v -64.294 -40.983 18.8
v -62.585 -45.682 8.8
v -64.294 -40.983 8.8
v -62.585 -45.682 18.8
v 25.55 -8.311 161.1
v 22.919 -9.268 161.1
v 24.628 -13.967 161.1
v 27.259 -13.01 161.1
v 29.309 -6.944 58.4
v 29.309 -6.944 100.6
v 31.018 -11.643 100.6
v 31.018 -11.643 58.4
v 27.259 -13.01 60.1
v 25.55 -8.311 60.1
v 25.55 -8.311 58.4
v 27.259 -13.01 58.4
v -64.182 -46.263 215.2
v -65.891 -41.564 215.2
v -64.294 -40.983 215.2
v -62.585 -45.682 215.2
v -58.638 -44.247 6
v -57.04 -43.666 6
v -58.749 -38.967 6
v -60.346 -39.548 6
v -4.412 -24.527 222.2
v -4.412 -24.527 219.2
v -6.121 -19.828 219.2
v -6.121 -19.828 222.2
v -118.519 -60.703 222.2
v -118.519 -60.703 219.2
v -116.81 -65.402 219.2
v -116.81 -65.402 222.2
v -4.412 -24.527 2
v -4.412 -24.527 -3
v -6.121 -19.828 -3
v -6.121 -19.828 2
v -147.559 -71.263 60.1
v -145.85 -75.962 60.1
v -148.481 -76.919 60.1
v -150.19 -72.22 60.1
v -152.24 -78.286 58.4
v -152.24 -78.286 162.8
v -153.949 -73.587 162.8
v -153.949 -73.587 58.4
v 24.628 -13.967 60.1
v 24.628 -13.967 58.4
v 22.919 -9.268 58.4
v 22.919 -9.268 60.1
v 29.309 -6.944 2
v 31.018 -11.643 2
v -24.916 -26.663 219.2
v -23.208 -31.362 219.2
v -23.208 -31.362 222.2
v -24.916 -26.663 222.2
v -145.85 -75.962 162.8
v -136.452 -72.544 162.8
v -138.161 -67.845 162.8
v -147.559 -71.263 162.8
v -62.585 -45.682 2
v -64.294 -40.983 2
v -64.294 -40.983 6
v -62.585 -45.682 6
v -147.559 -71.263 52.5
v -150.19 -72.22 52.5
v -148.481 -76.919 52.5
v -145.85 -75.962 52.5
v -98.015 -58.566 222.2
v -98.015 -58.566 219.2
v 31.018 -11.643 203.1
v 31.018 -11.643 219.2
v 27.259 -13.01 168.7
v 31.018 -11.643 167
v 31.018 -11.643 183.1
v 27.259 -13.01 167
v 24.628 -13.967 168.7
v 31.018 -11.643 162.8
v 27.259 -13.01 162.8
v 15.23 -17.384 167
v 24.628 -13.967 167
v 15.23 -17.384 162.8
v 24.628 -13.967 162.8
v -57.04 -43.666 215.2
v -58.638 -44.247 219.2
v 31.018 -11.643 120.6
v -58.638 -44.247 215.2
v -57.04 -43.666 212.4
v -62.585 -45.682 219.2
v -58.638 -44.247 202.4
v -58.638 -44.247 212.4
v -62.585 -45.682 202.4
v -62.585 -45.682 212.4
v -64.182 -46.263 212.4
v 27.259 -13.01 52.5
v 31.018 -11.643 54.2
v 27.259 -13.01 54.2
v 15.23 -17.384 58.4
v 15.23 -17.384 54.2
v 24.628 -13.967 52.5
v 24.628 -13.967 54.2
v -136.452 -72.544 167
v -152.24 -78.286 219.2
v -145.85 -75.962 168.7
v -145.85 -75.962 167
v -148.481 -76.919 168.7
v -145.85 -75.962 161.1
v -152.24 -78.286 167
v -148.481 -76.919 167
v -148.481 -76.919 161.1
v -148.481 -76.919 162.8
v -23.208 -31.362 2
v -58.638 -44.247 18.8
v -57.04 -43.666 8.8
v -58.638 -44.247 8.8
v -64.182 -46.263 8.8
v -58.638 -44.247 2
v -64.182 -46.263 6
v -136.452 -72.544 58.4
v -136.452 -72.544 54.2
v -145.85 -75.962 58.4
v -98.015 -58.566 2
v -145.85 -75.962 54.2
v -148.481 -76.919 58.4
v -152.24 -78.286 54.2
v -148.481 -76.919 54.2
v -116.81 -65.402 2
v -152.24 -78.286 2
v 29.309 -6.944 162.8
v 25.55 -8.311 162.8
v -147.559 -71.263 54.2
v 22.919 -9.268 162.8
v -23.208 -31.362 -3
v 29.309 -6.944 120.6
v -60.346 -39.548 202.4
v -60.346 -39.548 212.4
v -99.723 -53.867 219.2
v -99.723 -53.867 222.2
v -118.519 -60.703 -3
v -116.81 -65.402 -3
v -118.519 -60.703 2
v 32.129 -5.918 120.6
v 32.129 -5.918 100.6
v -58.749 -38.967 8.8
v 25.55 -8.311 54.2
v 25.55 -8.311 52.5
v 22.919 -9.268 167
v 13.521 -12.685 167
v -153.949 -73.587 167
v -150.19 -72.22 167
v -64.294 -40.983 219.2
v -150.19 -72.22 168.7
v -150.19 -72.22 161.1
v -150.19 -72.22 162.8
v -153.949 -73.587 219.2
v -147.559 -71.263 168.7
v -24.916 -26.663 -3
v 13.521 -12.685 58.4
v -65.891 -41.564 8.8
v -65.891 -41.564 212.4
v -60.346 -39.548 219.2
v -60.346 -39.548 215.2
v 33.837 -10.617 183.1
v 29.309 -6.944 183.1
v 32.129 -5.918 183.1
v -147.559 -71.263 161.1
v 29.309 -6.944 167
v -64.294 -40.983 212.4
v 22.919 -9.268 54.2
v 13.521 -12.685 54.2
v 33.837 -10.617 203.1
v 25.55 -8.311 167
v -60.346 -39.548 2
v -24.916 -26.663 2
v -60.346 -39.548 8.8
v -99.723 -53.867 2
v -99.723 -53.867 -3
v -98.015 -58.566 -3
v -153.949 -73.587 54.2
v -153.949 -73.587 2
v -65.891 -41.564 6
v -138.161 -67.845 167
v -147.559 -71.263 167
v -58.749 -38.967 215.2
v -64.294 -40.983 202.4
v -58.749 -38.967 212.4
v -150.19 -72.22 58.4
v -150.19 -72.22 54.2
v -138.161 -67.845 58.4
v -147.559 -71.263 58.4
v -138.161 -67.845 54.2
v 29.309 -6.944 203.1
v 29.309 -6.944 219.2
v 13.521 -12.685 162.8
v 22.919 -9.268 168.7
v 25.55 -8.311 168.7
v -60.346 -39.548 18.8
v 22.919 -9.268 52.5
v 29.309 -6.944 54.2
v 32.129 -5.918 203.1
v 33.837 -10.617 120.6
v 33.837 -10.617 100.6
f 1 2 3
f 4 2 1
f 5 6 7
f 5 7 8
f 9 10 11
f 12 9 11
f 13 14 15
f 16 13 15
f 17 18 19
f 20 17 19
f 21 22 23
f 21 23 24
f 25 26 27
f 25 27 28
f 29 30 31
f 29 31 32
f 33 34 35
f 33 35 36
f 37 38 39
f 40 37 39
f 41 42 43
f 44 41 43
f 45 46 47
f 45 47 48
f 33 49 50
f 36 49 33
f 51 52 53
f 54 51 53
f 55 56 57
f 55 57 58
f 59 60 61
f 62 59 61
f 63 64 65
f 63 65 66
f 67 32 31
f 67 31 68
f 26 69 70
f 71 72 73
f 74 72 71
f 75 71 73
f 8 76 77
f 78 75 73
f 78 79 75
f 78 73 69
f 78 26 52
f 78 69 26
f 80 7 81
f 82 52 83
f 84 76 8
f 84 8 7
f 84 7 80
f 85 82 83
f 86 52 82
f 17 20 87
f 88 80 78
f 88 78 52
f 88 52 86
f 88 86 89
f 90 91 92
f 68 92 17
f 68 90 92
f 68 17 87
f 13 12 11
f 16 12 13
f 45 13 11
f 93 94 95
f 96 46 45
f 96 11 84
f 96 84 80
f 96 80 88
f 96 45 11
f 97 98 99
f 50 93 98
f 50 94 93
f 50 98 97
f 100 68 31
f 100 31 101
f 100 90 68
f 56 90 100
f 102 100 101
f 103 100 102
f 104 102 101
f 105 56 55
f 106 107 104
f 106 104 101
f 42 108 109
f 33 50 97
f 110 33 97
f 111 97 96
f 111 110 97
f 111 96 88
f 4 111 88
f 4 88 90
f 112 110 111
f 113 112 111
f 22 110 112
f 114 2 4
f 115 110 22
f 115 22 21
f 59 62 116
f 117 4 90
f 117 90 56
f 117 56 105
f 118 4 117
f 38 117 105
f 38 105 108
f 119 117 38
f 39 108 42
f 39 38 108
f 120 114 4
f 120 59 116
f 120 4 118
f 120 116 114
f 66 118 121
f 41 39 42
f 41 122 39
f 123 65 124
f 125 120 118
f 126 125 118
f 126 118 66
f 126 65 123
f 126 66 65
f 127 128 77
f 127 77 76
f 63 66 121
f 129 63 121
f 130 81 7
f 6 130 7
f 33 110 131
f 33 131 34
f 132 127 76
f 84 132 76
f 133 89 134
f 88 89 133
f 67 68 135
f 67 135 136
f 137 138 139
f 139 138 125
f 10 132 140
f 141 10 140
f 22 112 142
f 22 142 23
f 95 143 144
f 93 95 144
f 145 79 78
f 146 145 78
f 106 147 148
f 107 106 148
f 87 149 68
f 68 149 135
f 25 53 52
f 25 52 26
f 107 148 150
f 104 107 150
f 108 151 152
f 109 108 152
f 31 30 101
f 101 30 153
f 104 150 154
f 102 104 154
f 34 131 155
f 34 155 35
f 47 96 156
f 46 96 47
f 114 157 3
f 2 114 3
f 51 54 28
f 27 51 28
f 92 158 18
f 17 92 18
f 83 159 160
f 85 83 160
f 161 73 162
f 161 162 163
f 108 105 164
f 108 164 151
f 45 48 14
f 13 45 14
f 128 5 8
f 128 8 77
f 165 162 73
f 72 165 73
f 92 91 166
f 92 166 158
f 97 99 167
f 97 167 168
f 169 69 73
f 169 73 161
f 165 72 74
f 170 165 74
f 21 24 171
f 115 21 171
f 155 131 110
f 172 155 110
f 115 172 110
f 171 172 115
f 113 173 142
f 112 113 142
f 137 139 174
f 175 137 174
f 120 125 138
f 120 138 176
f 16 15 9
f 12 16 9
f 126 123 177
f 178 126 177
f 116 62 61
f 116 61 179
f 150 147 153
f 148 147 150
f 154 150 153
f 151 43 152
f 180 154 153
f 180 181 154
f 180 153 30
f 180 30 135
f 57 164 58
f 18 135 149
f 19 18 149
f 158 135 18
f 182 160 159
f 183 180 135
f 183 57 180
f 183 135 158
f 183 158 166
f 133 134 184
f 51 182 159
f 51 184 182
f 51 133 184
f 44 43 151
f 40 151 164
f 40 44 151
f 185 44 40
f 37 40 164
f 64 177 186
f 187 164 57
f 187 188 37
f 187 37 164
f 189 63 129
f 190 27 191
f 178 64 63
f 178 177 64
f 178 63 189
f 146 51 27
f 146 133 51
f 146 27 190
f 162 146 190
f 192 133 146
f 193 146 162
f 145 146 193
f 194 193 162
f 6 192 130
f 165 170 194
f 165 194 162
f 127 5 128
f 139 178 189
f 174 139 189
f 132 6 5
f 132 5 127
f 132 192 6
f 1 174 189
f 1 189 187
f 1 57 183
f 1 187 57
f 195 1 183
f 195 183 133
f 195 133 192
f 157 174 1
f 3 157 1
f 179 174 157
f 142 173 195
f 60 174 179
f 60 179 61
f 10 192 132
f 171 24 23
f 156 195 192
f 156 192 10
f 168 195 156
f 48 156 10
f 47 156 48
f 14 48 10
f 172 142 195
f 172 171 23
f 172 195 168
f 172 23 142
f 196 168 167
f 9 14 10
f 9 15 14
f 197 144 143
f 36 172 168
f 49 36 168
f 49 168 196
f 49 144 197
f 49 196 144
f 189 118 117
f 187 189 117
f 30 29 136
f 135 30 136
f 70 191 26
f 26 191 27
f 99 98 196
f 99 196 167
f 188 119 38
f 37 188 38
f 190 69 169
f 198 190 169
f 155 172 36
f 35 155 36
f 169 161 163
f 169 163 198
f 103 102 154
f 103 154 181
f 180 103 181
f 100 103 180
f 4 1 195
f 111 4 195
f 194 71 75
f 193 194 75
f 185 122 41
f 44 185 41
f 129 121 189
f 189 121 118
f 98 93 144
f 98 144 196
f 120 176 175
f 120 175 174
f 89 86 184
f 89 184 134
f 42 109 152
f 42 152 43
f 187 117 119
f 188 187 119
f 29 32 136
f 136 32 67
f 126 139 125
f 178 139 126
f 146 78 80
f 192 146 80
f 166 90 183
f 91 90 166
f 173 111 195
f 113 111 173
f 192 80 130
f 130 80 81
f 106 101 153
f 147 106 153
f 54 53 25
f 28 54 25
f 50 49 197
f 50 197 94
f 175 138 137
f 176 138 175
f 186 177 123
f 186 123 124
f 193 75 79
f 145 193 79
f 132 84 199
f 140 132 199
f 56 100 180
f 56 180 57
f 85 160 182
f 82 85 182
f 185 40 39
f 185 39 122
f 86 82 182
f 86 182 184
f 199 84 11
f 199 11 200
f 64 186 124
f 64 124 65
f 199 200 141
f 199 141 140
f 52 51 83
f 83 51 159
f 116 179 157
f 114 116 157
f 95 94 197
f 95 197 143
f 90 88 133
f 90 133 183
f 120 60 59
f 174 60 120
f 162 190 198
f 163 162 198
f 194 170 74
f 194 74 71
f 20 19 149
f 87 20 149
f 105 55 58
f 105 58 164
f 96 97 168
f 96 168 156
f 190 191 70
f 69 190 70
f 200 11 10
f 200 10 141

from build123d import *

# Parameters (mm, degrees)
BOSS_EXTRUDE1_DEPTH = 217.2
CUT_EXTRUDE3_DEPTH  = 68.63050203
SKETCH5_W           = 20
SKETCH5_H           = 5
SKETCH5_W_2         = 3
SKETCH5_H_2         = 20
SKETCH5_H_3         = 3
BOSS_EXTRUDE2_DEPTH = 5


with BuildPart() as part:
    # Sketch2 → Boss-Extrude1 (new body)
    with BuildSketch(Plane.XY.offset(2)):
        Polygon((29.309289207, -6.943664177), (31.018091452, -11.642599682), (-152.24039327, -78.285887246), (-153.949195515, -73.586951741), align=None)
    extrude(amount=BOSS_EXTRUDE1_DEPTH)

    # Sketch4 → Cut-Extrude3 (cut, through all)
    with BuildSketch(Plane(origin=(7.362313595, -20.245196221, 0), x_dir=(-0.939787101, -0.341760449, 0), z_dir=(0.341760449, -0.939787101, 0))):
        Polygon((70.228577846, -2), (74.428577846, -2), (74.428577846, -6), (76.128577846, -6), (76.128577846, -8.8), (74.428577846, -8.8), (74.428577846, -18.8), (70.228577846, -18.8), (70.228577846, -8.8), (68.528577846, -8.8), (68.528577846, -6), (70.228577846, -6), align=None)
        Polygon((-25.171422154, -58.4), (-25.171422154, -54.2), (-21.171422154, -54.2), (-21.171422154, -52.5), (-18.371422154, -52.5), (-18.371422154, -54.2), (-8.371422154, -54.2), (-8.371422154, -58.4), (-18.371422154, -58.4), (-18.371422154, -60.1), (-21.171422154, -60.1), (-21.171422154, -58.4), align=None)
        Polygon((74.428577846, -219.2), (70.228577846, -219.2), (70.228577846, -215.2), (68.528577846, -215.2), (68.528577846, -212.4), (70.228577846, -212.4), (70.228577846, -202.4), (74.428577846, -202.4), (74.428577846, -212.4), (76.128577846, -212.4), (76.128577846, -215.2), (74.428577846, -215.2), align=None)
        Polygon((-21.171422154, -167), (-21.171422154, -168.7), (-18.371422154, -168.7), (-18.371422154, -167), (-8.371422154, -167), (-8.371422154, -162.8), (-18.371422154, -162.8), (-18.371422154, -161.1), (-21.171422154, -161.1), (-21.171422154, -162.8), (-25.171422154, -162.8), (-25.171422154, -167), align=None)
        Polygon((169.828577846, -162.8), (169.828577846, -167), (165.828577846, -167), (165.828577846, -168.7), (163.028577846, -168.7), (163.028577846, -167), (153.028577846, -167), (153.028577846, -162.8), (163.028577846, -162.8), (163.028577846, -161.1), (165.828577846, -161.1), (165.828577846, -162.8), align=None)
        Polygon((165.828577846, -54.2), (165.828577846, -52.5), (163.028577846, -52.5), (163.028577846, -54.2), (153.028577846, -54.2), (153.028577846, -58.4), (163.028577846, -58.4), (163.028577846, -60.1), (165.828577846, -60.1), (165.828577846, -58.4), (169.828577846, -58.4), (169.828577846, -54.2), align=None)
    extrude(amount=-CUT_EXTRUDE3_DEPTH, mode=Mode.SUBTRACT)

    # Sketch5 → Boss-Extrude2 (add)
    with BuildSketch(Plane(origin=(7.362313595, -20.245196221, 0), x_dir=(0.939787101, 0.341760449, 0), z_dir=(0.341760449, -0.939787101, 0))):
        with Locations((-22.528577846, -0.5)):
            Rectangle(SKETCH5_W, SKETCH5_H)
        with Locations((-122.128577846, -0.5)):
            Rectangle(SKETCH5_W, SKETCH5_H)
        with Locations((26.671422154, 110.6)):
            Rectangle(SKETCH5_W_2, SKETCH5_H_2)
        with Locations((26.671422154, 193.1)):
            Rectangle(SKETCH5_W_2, SKETCH5_H_2)
        with Locations((-22.528577846, 220.7)):
            Rectangle(SKETCH5_W, SKETCH5_H_3)
        with Locations((-122.128577846, 220.7)):
            Rectangle(SKETCH5_W, SKETCH5_H_3)
    extrude(amount=-BOSS_EXTRUDE2_DEPTH)


solid = part.part
